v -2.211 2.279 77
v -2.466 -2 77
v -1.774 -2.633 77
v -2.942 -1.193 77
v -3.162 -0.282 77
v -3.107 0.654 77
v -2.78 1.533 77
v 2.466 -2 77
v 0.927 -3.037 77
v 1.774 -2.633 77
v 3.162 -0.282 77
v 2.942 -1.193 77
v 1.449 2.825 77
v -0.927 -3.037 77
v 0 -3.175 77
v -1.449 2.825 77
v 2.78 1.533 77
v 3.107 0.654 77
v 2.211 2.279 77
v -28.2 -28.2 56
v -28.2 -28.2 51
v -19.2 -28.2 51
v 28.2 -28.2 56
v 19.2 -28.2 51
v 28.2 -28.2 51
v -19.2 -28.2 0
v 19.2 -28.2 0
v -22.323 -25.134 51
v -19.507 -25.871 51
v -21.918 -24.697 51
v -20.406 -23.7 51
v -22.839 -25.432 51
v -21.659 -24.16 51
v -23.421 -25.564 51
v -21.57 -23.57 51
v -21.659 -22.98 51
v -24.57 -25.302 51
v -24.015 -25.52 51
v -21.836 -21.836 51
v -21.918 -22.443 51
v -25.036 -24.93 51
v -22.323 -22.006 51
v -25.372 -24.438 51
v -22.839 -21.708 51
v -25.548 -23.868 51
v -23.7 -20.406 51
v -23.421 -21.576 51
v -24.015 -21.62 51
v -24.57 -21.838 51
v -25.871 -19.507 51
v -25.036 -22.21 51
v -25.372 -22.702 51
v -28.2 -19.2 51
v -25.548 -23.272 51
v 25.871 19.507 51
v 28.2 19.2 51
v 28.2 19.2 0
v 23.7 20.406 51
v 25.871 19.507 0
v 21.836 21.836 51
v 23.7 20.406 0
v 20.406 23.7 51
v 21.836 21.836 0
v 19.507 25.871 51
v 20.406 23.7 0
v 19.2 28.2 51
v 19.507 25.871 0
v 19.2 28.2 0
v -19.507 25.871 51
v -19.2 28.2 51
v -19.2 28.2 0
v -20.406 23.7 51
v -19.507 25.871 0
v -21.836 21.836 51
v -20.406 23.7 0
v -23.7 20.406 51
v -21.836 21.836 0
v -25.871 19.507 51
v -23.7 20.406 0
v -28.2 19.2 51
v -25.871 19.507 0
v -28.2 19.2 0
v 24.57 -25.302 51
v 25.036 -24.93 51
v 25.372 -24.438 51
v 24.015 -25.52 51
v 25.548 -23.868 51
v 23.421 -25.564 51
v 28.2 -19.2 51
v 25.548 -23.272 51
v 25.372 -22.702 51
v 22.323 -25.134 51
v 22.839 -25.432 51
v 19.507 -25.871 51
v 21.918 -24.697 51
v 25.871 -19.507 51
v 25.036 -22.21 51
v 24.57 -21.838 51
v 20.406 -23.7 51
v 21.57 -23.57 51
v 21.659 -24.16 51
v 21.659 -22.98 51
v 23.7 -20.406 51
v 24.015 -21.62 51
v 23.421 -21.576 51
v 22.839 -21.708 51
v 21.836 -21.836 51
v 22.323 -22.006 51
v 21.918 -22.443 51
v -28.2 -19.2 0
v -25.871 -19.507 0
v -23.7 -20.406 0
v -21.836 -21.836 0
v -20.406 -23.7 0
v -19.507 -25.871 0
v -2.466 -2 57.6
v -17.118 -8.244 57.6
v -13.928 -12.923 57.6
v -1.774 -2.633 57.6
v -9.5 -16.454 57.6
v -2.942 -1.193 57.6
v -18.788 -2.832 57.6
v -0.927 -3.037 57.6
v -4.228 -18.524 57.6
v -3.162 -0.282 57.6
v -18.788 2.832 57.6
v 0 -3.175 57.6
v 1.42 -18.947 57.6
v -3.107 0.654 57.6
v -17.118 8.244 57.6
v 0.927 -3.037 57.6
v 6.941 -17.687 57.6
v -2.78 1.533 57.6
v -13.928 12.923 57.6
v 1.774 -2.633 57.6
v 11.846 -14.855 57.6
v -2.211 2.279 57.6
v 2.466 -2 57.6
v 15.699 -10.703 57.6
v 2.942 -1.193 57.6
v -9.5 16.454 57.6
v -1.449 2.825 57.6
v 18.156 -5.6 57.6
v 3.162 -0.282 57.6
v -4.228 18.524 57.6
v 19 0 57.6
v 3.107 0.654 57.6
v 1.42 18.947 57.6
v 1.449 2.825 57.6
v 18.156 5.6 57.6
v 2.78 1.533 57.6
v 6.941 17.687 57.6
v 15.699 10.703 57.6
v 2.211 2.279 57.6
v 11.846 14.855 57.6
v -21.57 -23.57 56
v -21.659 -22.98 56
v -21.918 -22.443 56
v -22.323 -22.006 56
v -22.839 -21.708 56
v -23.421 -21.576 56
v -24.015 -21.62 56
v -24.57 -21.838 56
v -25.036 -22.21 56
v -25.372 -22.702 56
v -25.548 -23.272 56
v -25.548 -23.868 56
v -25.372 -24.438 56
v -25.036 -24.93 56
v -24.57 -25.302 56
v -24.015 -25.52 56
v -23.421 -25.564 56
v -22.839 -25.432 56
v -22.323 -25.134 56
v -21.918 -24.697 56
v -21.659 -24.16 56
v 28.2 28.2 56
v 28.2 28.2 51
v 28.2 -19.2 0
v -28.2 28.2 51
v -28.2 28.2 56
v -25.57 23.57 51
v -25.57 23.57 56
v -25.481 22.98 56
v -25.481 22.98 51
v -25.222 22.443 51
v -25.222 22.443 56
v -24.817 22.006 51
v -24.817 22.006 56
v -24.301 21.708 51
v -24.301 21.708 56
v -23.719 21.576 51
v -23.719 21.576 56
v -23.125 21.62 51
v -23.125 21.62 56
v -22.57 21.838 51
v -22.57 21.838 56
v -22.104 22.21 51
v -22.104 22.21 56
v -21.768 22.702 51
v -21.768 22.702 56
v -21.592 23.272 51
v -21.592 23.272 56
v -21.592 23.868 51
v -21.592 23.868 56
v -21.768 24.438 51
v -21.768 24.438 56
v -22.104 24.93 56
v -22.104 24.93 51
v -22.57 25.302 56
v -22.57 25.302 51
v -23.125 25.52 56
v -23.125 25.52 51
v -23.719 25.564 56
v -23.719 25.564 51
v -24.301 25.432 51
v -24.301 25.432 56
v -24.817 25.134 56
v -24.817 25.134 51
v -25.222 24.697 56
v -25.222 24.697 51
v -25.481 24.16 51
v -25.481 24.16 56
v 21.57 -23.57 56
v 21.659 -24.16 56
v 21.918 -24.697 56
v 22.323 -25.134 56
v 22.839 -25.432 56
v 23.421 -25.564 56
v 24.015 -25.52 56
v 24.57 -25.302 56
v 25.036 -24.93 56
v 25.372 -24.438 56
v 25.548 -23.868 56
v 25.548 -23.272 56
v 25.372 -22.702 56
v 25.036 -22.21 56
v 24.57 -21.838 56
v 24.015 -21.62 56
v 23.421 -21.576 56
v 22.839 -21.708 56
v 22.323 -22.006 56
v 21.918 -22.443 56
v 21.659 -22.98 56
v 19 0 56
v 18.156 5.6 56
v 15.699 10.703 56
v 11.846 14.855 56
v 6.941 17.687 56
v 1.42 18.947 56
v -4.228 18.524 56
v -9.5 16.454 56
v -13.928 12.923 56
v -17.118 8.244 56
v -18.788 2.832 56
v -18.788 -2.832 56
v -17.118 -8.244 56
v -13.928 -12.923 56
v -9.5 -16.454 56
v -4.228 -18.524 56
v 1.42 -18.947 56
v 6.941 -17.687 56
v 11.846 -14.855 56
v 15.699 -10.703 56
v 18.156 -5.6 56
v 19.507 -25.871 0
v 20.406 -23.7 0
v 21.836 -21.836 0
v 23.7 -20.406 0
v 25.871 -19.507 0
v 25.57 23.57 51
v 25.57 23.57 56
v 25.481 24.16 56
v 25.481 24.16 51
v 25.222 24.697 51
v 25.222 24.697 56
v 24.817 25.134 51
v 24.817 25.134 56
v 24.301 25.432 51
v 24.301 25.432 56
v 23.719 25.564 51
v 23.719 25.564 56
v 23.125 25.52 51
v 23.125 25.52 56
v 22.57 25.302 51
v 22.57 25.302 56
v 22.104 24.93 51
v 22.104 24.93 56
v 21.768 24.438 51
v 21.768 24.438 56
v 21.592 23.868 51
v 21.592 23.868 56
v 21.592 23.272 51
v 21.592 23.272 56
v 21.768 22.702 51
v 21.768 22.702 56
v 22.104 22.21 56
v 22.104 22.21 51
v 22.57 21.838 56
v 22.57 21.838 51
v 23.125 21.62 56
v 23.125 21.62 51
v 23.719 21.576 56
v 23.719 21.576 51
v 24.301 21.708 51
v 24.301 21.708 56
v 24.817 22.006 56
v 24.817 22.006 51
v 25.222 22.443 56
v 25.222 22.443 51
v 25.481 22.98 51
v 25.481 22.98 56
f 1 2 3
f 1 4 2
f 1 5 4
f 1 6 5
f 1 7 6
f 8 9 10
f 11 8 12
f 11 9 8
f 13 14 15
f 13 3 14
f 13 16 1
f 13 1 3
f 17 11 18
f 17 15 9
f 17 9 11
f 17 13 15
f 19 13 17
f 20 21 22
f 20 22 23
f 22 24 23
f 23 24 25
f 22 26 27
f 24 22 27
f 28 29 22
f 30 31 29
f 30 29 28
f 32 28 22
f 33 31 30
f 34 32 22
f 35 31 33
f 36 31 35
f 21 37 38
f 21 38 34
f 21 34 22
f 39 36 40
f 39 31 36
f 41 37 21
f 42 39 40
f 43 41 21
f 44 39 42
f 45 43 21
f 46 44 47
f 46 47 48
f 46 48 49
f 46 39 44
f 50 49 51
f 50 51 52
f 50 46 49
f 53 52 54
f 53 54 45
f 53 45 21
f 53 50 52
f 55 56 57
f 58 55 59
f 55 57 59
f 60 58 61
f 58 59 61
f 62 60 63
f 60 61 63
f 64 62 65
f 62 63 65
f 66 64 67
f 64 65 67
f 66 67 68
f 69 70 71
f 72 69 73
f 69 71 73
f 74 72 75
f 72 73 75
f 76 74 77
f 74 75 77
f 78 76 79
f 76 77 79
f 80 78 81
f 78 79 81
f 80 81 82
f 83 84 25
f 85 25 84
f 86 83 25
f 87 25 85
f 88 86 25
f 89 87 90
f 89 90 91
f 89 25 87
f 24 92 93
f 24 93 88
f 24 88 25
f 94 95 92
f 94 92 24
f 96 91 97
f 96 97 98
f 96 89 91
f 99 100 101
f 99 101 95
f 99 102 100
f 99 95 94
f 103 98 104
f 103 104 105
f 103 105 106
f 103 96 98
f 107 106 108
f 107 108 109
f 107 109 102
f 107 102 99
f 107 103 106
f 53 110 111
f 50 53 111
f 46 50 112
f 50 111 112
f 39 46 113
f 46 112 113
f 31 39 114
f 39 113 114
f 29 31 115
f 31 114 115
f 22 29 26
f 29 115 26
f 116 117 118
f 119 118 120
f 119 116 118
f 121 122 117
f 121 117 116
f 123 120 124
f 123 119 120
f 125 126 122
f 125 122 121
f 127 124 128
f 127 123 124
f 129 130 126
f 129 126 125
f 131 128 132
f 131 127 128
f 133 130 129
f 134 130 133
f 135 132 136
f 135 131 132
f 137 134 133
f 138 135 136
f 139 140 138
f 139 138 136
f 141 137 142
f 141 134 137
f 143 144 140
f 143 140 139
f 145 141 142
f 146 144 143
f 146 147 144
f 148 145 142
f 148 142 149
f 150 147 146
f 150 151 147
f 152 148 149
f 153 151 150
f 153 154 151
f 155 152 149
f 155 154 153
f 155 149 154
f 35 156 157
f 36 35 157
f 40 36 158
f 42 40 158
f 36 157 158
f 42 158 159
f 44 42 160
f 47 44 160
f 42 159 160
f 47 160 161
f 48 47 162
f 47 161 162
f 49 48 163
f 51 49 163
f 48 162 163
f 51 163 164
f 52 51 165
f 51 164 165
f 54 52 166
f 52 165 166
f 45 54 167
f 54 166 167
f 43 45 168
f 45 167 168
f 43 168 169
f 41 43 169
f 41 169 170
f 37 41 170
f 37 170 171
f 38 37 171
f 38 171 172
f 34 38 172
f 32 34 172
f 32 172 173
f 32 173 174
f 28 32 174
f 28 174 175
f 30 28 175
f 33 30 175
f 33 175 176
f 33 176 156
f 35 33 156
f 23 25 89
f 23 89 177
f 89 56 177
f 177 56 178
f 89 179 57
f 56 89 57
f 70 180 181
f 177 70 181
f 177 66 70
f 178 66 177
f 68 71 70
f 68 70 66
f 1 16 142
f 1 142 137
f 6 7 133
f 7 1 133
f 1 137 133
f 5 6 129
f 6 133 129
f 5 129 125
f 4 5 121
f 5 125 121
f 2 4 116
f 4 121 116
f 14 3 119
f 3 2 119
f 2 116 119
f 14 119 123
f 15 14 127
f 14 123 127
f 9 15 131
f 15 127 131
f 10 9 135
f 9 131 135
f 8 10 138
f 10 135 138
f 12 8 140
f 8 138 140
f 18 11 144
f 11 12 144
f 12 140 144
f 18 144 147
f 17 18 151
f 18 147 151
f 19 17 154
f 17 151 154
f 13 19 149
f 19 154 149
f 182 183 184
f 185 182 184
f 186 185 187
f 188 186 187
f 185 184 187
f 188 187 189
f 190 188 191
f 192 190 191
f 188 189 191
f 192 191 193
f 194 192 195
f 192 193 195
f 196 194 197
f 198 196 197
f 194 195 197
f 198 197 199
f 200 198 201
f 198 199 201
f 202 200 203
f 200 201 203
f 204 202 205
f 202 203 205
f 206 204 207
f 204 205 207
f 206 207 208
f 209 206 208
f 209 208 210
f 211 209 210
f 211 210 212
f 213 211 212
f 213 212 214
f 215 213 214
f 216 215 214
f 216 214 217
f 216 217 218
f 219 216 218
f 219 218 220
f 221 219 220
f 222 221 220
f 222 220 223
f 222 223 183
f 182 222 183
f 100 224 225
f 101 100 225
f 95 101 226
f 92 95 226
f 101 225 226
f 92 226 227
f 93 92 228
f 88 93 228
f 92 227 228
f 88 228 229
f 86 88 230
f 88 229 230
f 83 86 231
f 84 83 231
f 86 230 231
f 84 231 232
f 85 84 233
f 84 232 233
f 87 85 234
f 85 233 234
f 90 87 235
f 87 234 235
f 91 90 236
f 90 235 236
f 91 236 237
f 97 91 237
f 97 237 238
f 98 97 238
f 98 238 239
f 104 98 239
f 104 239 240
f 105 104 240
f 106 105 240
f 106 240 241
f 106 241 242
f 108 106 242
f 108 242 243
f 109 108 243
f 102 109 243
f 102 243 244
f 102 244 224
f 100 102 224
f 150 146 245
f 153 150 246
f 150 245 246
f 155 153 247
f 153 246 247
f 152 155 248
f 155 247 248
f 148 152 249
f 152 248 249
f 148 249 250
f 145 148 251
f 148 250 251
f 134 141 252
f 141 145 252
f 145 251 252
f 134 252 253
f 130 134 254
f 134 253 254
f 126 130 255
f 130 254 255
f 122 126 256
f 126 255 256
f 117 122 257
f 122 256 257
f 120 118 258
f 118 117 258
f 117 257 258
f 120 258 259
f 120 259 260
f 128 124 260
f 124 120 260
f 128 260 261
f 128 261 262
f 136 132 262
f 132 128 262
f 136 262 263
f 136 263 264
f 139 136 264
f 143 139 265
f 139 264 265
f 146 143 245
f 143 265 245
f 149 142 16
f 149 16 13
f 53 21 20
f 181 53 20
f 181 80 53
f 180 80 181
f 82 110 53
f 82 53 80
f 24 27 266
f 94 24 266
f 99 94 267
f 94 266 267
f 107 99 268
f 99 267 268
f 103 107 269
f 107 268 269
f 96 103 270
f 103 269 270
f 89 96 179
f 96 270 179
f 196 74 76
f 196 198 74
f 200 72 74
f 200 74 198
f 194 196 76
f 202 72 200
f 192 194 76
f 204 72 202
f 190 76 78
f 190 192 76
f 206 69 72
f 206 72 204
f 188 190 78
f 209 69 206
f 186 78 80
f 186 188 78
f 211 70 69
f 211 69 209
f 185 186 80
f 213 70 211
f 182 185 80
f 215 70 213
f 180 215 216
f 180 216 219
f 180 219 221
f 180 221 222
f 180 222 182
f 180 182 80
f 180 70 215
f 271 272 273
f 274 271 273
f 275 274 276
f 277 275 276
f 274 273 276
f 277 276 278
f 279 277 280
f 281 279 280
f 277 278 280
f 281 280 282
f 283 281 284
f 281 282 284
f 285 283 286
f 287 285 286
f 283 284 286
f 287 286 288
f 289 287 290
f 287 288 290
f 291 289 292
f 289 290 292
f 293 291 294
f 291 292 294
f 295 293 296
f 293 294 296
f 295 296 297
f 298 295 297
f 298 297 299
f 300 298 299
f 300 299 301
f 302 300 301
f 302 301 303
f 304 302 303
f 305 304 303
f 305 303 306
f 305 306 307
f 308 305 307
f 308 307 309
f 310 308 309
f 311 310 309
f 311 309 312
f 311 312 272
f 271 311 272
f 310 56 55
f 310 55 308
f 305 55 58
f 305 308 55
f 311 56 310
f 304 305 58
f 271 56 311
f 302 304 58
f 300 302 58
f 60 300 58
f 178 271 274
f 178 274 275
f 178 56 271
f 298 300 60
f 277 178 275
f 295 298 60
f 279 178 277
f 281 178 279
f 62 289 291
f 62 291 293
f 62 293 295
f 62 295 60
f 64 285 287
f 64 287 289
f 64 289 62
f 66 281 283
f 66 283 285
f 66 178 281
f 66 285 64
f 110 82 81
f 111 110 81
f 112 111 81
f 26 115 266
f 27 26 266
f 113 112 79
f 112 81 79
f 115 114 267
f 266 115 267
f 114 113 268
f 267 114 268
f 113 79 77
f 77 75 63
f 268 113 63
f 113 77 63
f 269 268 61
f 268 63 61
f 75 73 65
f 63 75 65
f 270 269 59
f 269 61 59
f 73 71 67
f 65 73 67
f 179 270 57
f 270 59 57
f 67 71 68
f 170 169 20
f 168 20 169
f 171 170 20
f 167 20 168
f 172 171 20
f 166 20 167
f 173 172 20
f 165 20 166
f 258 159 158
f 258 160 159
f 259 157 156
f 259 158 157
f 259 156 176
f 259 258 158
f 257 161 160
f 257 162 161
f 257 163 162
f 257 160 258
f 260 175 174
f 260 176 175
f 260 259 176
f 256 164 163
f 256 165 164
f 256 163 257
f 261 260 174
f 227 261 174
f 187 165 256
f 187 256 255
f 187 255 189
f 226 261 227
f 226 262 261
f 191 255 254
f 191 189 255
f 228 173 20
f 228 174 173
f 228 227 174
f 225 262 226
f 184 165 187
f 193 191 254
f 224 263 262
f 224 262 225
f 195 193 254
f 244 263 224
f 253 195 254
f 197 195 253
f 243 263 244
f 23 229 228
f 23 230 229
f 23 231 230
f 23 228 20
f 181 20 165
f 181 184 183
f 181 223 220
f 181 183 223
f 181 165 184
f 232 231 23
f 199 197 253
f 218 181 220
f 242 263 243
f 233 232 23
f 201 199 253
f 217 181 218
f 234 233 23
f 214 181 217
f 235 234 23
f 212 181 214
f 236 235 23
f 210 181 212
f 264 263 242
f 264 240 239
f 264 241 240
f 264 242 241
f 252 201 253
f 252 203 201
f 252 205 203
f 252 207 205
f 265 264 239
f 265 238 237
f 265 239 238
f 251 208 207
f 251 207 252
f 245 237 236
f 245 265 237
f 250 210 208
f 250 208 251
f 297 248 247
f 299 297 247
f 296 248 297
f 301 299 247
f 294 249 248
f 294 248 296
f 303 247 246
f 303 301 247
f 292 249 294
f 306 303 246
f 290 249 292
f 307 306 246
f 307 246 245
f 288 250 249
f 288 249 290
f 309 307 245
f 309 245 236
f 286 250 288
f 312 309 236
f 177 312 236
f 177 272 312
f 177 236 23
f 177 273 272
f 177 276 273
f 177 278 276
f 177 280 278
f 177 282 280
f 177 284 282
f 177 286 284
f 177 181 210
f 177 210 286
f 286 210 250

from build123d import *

# Parameters (mm, degrees)
SKETCH1_W           = 56.4
SKETCH1_H           = 56.4
BOSS_EXTRUDE1_DEPTH = 56
SKETCH2_R           = 19
BOSS_EXTRUDE2_DEPTH = 1.6
SKETCH3_R           = 3.175
BOSS_EXTRUDE3_DEPTH = 19.4
CUT_EXTRUDE1_DEPTH  = 19.4
SKETCH5_R           = 2
CUT_EXTRUDE2_DEPTH  = 69.749399997
SKETCH6_R           = 9
CUT_EXTRUDE3_DEPTH  = 51


with BuildPart() as part:
    # Sketch1 → Boss-Extrude1 (new body)
    with BuildSketch(Plane.XY):
        Rectangle(SKETCH1_W, SKETCH1_H)
    extrude(amount=BOSS_EXTRUDE1_DEPTH)

    # Sketch2 → Boss-Extrude2 (add)
    with BuildSketch(Plane.XY.offset(56)):
        Circle(SKETCH2_R)
    extrude(amount=BOSS_EXTRUDE2_DEPTH)

    # Sketch3 → Boss-Extrude3 (add)
    with BuildSketch(Plane.XY.offset(57.6)):
        Circle(SKETCH3_R)
    extrude(amount=BOSS_EXTRUDE3_DEPTH)

    # Sketch4 → Cut-Extrude1 (cut)
    with BuildSketch(Plane.XY.offset(77)):
        Polygon((-97.277384537, 2.825), (-1.449137675, 2.825), (1.449137675, 2.825), (97.277384537, 2.825), (97.277384537, 194.481493724), (-97.277384537, 194.481493724), align=None)
    extrude(amount=-CUT_EXTRUDE1_DEPTH, mode=Mode.SUBTRACT)

    # Sketch5 → Cut-Extrude2 (cut, through all)
    with BuildSketch(Plane.XY.offset(56)):
        with Locations((23.57, 23.57)):
            Circle(SKETCH5_R)
        with Locations(Location((-23.57, 23.57, 0), (0, 0, 180))):
            Circle(SKETCH5_R)
        with Locations(Location((23.57, -23.57, 0), (0, 0, 180))):
            Circle(SKETCH5_R)
        with Locations((-23.57, -23.57)):
            Circle(SKETCH5_R)
    extrude(amount=-CUT_EXTRUDE2_DEPTH, mode=Mode.SUBTRACT)

    # Sketch6 → Cut-Extrude3 (cut)
    with BuildSketch(Plane(origin=(0, 0, 0), x_dir=(-1, 0, 0), z_dir=(0, 0, -1))):
        with Locations((-28.2, 28.2)):
            Circle(SKETCH6_R)
        with Locations((-28.2, -28.2)):
            Circle(SKETCH6_R)
        with Locations((28.2, -28.2)):
            Circle(SKETCH6_R)
        with Locations((28.2, 28.2)):
            Circle(SKETCH6_R)
    extrude(amount=-CUT_EXTRUDE3_DEPTH, mode=Mode.SUBTRACT)


solid = part.part
